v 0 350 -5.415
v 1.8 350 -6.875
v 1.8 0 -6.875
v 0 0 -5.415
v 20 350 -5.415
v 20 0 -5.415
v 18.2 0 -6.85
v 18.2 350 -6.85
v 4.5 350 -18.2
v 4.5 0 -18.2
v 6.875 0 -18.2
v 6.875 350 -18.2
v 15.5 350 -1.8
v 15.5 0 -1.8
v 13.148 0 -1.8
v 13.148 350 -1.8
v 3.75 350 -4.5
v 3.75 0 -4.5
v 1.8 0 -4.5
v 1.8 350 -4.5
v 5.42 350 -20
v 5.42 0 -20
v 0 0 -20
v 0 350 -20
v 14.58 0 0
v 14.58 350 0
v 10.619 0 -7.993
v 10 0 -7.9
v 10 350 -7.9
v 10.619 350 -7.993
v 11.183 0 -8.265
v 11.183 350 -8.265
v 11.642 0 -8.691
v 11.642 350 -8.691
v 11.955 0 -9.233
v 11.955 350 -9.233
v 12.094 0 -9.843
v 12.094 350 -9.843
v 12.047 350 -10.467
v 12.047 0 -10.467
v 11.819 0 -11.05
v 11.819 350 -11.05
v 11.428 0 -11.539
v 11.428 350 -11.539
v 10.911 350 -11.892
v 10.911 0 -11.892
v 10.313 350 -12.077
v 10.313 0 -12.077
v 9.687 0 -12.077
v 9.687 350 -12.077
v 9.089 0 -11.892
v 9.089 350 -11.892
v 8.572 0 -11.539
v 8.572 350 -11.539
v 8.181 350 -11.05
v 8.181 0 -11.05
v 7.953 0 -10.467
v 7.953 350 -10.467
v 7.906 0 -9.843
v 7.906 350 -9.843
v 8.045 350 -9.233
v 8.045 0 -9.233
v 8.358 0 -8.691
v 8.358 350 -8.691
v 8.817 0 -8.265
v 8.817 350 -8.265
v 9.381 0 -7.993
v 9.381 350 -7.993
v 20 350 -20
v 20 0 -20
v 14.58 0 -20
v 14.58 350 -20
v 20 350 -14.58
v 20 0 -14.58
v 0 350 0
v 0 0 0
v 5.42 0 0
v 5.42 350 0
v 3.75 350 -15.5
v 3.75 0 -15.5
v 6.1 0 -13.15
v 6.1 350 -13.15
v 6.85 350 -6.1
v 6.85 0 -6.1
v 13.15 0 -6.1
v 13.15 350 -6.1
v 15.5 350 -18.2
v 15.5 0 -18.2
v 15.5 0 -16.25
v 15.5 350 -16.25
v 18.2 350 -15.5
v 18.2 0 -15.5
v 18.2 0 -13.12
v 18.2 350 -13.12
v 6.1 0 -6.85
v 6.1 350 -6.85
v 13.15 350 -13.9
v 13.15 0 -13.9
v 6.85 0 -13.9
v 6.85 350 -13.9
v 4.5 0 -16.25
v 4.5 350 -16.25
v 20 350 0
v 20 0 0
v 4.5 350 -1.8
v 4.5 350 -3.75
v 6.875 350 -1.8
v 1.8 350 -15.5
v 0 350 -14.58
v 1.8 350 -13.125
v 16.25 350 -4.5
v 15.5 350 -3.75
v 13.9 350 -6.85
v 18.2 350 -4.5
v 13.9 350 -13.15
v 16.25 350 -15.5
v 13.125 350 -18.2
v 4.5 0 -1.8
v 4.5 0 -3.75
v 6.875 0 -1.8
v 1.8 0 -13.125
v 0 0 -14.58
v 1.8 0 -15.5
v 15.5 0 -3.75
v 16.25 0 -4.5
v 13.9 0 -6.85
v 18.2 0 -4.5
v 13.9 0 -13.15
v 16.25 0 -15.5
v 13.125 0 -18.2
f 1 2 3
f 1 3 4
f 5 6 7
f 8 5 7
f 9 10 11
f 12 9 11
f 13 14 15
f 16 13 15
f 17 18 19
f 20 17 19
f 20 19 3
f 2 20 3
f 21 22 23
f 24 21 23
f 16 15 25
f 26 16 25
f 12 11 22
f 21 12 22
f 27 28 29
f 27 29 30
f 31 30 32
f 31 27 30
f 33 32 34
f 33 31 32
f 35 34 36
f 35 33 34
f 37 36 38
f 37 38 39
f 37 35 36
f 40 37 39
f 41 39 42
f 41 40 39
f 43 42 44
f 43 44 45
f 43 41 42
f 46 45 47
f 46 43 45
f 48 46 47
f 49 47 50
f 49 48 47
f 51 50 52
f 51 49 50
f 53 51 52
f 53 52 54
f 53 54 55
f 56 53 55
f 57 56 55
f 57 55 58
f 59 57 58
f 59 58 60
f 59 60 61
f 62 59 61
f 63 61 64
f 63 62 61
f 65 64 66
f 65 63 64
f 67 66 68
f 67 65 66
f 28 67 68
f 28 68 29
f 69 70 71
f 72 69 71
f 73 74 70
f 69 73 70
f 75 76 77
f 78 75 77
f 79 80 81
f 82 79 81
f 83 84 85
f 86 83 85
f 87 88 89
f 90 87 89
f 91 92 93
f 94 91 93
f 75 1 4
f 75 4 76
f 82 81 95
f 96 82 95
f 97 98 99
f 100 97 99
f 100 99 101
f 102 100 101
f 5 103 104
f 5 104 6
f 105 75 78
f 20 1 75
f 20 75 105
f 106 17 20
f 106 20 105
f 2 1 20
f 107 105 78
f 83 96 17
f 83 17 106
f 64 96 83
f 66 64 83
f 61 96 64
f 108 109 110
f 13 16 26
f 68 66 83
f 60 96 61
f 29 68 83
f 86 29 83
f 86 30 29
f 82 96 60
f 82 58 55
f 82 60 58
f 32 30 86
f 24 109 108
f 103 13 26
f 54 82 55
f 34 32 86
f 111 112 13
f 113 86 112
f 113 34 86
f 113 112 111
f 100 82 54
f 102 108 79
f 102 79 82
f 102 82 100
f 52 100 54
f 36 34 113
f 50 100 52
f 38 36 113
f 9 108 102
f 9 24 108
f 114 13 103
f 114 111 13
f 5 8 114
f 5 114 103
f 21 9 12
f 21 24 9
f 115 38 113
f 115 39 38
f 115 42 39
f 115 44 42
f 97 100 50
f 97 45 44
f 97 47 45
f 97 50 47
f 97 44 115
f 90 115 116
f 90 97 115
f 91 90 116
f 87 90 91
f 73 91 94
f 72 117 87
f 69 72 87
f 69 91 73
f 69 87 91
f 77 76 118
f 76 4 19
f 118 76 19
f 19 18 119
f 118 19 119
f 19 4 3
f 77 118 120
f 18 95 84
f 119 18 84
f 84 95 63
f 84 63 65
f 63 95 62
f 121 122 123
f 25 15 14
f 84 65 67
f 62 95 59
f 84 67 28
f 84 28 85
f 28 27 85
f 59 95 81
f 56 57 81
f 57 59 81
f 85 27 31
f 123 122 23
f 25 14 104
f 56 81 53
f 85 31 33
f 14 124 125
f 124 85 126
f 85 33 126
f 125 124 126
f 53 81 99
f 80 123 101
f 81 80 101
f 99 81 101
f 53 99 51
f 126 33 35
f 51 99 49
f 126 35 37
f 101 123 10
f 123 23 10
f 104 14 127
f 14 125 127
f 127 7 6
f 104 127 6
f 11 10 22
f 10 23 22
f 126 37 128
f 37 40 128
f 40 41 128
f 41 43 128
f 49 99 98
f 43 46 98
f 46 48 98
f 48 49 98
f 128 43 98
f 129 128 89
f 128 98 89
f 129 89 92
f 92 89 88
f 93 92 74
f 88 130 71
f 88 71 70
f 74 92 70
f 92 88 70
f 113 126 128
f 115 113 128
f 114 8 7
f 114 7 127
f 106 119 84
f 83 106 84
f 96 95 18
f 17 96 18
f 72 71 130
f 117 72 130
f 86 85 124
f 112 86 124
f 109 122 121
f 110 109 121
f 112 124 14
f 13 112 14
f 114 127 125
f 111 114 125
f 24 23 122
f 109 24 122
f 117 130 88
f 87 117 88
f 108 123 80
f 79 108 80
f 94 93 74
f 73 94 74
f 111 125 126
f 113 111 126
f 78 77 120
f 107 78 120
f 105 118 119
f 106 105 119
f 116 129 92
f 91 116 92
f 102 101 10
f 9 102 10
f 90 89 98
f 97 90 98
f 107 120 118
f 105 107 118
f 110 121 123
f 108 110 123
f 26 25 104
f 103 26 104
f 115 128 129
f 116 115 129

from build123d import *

# Parameters (mm, degrees)
SKETCH1_R           = 2.1
BOSS_EXTRUDE1_DEPTH = 350


with BuildPart() as part:
    # Sketch1 → Boss-Extrude1 (new body)
    with BuildSketch(Plane(origin=(0, 0, 0), x_dir=(1, 0, 0), z_dir=(0, 1, 0))):
        Polygon((0, 5.415), (0, 0), (4.5, 0), (5.42, 0), (6.875, 1.8), (4.5, 1.8), (4.5, 3.75), (6.85, 6.1), (13.15, 6.1), (15.5, 3.75), (15.5, 1.8), (13.147527473, 1.8), (14.58, 0), (20, 0), (20, 4.5), (20, 5.415), (18.2, 6.85), (18.2, 5.415), (18.2, 4.5), (16.25, 4.5), (13.9, 6.85), (13.9, 13.15), (16.25, 15.5), (18.2, 15.5), (18.2, 13.12), (20, 14.58), (20, 20), (15.5, 20), (14.58, 20), (13.125, 18.2), (15.5, 18.2), (15.5, 16.25), (13.15, 13.9), (6.85, 13.9), (4.5, 16.25), (4.5, 18.2), (6.875, 18.2), (5.42, 20), (4.5, 20), (0, 20), (0, 14.700042406), (0, 14.58), (1.8, 13.125), (1.8, 14.58), (1.8, 14.700042406), (1.8, 15.5), (3.75, 15.5), (6.1, 13.15), (6.1, 6.85), (3.75, 4.5), (1.8, 4.5), (1.8, 5.415), (1.8, 6.875), align=None)
        with Locations(Location((10, 10, 0), (0, 0, 270))):
            Circle(SKETCH1_R, mode=Mode.SUBTRACT)
    extrude(amount=BOSS_EXTRUDE1_DEPTH)


solid = part.part
